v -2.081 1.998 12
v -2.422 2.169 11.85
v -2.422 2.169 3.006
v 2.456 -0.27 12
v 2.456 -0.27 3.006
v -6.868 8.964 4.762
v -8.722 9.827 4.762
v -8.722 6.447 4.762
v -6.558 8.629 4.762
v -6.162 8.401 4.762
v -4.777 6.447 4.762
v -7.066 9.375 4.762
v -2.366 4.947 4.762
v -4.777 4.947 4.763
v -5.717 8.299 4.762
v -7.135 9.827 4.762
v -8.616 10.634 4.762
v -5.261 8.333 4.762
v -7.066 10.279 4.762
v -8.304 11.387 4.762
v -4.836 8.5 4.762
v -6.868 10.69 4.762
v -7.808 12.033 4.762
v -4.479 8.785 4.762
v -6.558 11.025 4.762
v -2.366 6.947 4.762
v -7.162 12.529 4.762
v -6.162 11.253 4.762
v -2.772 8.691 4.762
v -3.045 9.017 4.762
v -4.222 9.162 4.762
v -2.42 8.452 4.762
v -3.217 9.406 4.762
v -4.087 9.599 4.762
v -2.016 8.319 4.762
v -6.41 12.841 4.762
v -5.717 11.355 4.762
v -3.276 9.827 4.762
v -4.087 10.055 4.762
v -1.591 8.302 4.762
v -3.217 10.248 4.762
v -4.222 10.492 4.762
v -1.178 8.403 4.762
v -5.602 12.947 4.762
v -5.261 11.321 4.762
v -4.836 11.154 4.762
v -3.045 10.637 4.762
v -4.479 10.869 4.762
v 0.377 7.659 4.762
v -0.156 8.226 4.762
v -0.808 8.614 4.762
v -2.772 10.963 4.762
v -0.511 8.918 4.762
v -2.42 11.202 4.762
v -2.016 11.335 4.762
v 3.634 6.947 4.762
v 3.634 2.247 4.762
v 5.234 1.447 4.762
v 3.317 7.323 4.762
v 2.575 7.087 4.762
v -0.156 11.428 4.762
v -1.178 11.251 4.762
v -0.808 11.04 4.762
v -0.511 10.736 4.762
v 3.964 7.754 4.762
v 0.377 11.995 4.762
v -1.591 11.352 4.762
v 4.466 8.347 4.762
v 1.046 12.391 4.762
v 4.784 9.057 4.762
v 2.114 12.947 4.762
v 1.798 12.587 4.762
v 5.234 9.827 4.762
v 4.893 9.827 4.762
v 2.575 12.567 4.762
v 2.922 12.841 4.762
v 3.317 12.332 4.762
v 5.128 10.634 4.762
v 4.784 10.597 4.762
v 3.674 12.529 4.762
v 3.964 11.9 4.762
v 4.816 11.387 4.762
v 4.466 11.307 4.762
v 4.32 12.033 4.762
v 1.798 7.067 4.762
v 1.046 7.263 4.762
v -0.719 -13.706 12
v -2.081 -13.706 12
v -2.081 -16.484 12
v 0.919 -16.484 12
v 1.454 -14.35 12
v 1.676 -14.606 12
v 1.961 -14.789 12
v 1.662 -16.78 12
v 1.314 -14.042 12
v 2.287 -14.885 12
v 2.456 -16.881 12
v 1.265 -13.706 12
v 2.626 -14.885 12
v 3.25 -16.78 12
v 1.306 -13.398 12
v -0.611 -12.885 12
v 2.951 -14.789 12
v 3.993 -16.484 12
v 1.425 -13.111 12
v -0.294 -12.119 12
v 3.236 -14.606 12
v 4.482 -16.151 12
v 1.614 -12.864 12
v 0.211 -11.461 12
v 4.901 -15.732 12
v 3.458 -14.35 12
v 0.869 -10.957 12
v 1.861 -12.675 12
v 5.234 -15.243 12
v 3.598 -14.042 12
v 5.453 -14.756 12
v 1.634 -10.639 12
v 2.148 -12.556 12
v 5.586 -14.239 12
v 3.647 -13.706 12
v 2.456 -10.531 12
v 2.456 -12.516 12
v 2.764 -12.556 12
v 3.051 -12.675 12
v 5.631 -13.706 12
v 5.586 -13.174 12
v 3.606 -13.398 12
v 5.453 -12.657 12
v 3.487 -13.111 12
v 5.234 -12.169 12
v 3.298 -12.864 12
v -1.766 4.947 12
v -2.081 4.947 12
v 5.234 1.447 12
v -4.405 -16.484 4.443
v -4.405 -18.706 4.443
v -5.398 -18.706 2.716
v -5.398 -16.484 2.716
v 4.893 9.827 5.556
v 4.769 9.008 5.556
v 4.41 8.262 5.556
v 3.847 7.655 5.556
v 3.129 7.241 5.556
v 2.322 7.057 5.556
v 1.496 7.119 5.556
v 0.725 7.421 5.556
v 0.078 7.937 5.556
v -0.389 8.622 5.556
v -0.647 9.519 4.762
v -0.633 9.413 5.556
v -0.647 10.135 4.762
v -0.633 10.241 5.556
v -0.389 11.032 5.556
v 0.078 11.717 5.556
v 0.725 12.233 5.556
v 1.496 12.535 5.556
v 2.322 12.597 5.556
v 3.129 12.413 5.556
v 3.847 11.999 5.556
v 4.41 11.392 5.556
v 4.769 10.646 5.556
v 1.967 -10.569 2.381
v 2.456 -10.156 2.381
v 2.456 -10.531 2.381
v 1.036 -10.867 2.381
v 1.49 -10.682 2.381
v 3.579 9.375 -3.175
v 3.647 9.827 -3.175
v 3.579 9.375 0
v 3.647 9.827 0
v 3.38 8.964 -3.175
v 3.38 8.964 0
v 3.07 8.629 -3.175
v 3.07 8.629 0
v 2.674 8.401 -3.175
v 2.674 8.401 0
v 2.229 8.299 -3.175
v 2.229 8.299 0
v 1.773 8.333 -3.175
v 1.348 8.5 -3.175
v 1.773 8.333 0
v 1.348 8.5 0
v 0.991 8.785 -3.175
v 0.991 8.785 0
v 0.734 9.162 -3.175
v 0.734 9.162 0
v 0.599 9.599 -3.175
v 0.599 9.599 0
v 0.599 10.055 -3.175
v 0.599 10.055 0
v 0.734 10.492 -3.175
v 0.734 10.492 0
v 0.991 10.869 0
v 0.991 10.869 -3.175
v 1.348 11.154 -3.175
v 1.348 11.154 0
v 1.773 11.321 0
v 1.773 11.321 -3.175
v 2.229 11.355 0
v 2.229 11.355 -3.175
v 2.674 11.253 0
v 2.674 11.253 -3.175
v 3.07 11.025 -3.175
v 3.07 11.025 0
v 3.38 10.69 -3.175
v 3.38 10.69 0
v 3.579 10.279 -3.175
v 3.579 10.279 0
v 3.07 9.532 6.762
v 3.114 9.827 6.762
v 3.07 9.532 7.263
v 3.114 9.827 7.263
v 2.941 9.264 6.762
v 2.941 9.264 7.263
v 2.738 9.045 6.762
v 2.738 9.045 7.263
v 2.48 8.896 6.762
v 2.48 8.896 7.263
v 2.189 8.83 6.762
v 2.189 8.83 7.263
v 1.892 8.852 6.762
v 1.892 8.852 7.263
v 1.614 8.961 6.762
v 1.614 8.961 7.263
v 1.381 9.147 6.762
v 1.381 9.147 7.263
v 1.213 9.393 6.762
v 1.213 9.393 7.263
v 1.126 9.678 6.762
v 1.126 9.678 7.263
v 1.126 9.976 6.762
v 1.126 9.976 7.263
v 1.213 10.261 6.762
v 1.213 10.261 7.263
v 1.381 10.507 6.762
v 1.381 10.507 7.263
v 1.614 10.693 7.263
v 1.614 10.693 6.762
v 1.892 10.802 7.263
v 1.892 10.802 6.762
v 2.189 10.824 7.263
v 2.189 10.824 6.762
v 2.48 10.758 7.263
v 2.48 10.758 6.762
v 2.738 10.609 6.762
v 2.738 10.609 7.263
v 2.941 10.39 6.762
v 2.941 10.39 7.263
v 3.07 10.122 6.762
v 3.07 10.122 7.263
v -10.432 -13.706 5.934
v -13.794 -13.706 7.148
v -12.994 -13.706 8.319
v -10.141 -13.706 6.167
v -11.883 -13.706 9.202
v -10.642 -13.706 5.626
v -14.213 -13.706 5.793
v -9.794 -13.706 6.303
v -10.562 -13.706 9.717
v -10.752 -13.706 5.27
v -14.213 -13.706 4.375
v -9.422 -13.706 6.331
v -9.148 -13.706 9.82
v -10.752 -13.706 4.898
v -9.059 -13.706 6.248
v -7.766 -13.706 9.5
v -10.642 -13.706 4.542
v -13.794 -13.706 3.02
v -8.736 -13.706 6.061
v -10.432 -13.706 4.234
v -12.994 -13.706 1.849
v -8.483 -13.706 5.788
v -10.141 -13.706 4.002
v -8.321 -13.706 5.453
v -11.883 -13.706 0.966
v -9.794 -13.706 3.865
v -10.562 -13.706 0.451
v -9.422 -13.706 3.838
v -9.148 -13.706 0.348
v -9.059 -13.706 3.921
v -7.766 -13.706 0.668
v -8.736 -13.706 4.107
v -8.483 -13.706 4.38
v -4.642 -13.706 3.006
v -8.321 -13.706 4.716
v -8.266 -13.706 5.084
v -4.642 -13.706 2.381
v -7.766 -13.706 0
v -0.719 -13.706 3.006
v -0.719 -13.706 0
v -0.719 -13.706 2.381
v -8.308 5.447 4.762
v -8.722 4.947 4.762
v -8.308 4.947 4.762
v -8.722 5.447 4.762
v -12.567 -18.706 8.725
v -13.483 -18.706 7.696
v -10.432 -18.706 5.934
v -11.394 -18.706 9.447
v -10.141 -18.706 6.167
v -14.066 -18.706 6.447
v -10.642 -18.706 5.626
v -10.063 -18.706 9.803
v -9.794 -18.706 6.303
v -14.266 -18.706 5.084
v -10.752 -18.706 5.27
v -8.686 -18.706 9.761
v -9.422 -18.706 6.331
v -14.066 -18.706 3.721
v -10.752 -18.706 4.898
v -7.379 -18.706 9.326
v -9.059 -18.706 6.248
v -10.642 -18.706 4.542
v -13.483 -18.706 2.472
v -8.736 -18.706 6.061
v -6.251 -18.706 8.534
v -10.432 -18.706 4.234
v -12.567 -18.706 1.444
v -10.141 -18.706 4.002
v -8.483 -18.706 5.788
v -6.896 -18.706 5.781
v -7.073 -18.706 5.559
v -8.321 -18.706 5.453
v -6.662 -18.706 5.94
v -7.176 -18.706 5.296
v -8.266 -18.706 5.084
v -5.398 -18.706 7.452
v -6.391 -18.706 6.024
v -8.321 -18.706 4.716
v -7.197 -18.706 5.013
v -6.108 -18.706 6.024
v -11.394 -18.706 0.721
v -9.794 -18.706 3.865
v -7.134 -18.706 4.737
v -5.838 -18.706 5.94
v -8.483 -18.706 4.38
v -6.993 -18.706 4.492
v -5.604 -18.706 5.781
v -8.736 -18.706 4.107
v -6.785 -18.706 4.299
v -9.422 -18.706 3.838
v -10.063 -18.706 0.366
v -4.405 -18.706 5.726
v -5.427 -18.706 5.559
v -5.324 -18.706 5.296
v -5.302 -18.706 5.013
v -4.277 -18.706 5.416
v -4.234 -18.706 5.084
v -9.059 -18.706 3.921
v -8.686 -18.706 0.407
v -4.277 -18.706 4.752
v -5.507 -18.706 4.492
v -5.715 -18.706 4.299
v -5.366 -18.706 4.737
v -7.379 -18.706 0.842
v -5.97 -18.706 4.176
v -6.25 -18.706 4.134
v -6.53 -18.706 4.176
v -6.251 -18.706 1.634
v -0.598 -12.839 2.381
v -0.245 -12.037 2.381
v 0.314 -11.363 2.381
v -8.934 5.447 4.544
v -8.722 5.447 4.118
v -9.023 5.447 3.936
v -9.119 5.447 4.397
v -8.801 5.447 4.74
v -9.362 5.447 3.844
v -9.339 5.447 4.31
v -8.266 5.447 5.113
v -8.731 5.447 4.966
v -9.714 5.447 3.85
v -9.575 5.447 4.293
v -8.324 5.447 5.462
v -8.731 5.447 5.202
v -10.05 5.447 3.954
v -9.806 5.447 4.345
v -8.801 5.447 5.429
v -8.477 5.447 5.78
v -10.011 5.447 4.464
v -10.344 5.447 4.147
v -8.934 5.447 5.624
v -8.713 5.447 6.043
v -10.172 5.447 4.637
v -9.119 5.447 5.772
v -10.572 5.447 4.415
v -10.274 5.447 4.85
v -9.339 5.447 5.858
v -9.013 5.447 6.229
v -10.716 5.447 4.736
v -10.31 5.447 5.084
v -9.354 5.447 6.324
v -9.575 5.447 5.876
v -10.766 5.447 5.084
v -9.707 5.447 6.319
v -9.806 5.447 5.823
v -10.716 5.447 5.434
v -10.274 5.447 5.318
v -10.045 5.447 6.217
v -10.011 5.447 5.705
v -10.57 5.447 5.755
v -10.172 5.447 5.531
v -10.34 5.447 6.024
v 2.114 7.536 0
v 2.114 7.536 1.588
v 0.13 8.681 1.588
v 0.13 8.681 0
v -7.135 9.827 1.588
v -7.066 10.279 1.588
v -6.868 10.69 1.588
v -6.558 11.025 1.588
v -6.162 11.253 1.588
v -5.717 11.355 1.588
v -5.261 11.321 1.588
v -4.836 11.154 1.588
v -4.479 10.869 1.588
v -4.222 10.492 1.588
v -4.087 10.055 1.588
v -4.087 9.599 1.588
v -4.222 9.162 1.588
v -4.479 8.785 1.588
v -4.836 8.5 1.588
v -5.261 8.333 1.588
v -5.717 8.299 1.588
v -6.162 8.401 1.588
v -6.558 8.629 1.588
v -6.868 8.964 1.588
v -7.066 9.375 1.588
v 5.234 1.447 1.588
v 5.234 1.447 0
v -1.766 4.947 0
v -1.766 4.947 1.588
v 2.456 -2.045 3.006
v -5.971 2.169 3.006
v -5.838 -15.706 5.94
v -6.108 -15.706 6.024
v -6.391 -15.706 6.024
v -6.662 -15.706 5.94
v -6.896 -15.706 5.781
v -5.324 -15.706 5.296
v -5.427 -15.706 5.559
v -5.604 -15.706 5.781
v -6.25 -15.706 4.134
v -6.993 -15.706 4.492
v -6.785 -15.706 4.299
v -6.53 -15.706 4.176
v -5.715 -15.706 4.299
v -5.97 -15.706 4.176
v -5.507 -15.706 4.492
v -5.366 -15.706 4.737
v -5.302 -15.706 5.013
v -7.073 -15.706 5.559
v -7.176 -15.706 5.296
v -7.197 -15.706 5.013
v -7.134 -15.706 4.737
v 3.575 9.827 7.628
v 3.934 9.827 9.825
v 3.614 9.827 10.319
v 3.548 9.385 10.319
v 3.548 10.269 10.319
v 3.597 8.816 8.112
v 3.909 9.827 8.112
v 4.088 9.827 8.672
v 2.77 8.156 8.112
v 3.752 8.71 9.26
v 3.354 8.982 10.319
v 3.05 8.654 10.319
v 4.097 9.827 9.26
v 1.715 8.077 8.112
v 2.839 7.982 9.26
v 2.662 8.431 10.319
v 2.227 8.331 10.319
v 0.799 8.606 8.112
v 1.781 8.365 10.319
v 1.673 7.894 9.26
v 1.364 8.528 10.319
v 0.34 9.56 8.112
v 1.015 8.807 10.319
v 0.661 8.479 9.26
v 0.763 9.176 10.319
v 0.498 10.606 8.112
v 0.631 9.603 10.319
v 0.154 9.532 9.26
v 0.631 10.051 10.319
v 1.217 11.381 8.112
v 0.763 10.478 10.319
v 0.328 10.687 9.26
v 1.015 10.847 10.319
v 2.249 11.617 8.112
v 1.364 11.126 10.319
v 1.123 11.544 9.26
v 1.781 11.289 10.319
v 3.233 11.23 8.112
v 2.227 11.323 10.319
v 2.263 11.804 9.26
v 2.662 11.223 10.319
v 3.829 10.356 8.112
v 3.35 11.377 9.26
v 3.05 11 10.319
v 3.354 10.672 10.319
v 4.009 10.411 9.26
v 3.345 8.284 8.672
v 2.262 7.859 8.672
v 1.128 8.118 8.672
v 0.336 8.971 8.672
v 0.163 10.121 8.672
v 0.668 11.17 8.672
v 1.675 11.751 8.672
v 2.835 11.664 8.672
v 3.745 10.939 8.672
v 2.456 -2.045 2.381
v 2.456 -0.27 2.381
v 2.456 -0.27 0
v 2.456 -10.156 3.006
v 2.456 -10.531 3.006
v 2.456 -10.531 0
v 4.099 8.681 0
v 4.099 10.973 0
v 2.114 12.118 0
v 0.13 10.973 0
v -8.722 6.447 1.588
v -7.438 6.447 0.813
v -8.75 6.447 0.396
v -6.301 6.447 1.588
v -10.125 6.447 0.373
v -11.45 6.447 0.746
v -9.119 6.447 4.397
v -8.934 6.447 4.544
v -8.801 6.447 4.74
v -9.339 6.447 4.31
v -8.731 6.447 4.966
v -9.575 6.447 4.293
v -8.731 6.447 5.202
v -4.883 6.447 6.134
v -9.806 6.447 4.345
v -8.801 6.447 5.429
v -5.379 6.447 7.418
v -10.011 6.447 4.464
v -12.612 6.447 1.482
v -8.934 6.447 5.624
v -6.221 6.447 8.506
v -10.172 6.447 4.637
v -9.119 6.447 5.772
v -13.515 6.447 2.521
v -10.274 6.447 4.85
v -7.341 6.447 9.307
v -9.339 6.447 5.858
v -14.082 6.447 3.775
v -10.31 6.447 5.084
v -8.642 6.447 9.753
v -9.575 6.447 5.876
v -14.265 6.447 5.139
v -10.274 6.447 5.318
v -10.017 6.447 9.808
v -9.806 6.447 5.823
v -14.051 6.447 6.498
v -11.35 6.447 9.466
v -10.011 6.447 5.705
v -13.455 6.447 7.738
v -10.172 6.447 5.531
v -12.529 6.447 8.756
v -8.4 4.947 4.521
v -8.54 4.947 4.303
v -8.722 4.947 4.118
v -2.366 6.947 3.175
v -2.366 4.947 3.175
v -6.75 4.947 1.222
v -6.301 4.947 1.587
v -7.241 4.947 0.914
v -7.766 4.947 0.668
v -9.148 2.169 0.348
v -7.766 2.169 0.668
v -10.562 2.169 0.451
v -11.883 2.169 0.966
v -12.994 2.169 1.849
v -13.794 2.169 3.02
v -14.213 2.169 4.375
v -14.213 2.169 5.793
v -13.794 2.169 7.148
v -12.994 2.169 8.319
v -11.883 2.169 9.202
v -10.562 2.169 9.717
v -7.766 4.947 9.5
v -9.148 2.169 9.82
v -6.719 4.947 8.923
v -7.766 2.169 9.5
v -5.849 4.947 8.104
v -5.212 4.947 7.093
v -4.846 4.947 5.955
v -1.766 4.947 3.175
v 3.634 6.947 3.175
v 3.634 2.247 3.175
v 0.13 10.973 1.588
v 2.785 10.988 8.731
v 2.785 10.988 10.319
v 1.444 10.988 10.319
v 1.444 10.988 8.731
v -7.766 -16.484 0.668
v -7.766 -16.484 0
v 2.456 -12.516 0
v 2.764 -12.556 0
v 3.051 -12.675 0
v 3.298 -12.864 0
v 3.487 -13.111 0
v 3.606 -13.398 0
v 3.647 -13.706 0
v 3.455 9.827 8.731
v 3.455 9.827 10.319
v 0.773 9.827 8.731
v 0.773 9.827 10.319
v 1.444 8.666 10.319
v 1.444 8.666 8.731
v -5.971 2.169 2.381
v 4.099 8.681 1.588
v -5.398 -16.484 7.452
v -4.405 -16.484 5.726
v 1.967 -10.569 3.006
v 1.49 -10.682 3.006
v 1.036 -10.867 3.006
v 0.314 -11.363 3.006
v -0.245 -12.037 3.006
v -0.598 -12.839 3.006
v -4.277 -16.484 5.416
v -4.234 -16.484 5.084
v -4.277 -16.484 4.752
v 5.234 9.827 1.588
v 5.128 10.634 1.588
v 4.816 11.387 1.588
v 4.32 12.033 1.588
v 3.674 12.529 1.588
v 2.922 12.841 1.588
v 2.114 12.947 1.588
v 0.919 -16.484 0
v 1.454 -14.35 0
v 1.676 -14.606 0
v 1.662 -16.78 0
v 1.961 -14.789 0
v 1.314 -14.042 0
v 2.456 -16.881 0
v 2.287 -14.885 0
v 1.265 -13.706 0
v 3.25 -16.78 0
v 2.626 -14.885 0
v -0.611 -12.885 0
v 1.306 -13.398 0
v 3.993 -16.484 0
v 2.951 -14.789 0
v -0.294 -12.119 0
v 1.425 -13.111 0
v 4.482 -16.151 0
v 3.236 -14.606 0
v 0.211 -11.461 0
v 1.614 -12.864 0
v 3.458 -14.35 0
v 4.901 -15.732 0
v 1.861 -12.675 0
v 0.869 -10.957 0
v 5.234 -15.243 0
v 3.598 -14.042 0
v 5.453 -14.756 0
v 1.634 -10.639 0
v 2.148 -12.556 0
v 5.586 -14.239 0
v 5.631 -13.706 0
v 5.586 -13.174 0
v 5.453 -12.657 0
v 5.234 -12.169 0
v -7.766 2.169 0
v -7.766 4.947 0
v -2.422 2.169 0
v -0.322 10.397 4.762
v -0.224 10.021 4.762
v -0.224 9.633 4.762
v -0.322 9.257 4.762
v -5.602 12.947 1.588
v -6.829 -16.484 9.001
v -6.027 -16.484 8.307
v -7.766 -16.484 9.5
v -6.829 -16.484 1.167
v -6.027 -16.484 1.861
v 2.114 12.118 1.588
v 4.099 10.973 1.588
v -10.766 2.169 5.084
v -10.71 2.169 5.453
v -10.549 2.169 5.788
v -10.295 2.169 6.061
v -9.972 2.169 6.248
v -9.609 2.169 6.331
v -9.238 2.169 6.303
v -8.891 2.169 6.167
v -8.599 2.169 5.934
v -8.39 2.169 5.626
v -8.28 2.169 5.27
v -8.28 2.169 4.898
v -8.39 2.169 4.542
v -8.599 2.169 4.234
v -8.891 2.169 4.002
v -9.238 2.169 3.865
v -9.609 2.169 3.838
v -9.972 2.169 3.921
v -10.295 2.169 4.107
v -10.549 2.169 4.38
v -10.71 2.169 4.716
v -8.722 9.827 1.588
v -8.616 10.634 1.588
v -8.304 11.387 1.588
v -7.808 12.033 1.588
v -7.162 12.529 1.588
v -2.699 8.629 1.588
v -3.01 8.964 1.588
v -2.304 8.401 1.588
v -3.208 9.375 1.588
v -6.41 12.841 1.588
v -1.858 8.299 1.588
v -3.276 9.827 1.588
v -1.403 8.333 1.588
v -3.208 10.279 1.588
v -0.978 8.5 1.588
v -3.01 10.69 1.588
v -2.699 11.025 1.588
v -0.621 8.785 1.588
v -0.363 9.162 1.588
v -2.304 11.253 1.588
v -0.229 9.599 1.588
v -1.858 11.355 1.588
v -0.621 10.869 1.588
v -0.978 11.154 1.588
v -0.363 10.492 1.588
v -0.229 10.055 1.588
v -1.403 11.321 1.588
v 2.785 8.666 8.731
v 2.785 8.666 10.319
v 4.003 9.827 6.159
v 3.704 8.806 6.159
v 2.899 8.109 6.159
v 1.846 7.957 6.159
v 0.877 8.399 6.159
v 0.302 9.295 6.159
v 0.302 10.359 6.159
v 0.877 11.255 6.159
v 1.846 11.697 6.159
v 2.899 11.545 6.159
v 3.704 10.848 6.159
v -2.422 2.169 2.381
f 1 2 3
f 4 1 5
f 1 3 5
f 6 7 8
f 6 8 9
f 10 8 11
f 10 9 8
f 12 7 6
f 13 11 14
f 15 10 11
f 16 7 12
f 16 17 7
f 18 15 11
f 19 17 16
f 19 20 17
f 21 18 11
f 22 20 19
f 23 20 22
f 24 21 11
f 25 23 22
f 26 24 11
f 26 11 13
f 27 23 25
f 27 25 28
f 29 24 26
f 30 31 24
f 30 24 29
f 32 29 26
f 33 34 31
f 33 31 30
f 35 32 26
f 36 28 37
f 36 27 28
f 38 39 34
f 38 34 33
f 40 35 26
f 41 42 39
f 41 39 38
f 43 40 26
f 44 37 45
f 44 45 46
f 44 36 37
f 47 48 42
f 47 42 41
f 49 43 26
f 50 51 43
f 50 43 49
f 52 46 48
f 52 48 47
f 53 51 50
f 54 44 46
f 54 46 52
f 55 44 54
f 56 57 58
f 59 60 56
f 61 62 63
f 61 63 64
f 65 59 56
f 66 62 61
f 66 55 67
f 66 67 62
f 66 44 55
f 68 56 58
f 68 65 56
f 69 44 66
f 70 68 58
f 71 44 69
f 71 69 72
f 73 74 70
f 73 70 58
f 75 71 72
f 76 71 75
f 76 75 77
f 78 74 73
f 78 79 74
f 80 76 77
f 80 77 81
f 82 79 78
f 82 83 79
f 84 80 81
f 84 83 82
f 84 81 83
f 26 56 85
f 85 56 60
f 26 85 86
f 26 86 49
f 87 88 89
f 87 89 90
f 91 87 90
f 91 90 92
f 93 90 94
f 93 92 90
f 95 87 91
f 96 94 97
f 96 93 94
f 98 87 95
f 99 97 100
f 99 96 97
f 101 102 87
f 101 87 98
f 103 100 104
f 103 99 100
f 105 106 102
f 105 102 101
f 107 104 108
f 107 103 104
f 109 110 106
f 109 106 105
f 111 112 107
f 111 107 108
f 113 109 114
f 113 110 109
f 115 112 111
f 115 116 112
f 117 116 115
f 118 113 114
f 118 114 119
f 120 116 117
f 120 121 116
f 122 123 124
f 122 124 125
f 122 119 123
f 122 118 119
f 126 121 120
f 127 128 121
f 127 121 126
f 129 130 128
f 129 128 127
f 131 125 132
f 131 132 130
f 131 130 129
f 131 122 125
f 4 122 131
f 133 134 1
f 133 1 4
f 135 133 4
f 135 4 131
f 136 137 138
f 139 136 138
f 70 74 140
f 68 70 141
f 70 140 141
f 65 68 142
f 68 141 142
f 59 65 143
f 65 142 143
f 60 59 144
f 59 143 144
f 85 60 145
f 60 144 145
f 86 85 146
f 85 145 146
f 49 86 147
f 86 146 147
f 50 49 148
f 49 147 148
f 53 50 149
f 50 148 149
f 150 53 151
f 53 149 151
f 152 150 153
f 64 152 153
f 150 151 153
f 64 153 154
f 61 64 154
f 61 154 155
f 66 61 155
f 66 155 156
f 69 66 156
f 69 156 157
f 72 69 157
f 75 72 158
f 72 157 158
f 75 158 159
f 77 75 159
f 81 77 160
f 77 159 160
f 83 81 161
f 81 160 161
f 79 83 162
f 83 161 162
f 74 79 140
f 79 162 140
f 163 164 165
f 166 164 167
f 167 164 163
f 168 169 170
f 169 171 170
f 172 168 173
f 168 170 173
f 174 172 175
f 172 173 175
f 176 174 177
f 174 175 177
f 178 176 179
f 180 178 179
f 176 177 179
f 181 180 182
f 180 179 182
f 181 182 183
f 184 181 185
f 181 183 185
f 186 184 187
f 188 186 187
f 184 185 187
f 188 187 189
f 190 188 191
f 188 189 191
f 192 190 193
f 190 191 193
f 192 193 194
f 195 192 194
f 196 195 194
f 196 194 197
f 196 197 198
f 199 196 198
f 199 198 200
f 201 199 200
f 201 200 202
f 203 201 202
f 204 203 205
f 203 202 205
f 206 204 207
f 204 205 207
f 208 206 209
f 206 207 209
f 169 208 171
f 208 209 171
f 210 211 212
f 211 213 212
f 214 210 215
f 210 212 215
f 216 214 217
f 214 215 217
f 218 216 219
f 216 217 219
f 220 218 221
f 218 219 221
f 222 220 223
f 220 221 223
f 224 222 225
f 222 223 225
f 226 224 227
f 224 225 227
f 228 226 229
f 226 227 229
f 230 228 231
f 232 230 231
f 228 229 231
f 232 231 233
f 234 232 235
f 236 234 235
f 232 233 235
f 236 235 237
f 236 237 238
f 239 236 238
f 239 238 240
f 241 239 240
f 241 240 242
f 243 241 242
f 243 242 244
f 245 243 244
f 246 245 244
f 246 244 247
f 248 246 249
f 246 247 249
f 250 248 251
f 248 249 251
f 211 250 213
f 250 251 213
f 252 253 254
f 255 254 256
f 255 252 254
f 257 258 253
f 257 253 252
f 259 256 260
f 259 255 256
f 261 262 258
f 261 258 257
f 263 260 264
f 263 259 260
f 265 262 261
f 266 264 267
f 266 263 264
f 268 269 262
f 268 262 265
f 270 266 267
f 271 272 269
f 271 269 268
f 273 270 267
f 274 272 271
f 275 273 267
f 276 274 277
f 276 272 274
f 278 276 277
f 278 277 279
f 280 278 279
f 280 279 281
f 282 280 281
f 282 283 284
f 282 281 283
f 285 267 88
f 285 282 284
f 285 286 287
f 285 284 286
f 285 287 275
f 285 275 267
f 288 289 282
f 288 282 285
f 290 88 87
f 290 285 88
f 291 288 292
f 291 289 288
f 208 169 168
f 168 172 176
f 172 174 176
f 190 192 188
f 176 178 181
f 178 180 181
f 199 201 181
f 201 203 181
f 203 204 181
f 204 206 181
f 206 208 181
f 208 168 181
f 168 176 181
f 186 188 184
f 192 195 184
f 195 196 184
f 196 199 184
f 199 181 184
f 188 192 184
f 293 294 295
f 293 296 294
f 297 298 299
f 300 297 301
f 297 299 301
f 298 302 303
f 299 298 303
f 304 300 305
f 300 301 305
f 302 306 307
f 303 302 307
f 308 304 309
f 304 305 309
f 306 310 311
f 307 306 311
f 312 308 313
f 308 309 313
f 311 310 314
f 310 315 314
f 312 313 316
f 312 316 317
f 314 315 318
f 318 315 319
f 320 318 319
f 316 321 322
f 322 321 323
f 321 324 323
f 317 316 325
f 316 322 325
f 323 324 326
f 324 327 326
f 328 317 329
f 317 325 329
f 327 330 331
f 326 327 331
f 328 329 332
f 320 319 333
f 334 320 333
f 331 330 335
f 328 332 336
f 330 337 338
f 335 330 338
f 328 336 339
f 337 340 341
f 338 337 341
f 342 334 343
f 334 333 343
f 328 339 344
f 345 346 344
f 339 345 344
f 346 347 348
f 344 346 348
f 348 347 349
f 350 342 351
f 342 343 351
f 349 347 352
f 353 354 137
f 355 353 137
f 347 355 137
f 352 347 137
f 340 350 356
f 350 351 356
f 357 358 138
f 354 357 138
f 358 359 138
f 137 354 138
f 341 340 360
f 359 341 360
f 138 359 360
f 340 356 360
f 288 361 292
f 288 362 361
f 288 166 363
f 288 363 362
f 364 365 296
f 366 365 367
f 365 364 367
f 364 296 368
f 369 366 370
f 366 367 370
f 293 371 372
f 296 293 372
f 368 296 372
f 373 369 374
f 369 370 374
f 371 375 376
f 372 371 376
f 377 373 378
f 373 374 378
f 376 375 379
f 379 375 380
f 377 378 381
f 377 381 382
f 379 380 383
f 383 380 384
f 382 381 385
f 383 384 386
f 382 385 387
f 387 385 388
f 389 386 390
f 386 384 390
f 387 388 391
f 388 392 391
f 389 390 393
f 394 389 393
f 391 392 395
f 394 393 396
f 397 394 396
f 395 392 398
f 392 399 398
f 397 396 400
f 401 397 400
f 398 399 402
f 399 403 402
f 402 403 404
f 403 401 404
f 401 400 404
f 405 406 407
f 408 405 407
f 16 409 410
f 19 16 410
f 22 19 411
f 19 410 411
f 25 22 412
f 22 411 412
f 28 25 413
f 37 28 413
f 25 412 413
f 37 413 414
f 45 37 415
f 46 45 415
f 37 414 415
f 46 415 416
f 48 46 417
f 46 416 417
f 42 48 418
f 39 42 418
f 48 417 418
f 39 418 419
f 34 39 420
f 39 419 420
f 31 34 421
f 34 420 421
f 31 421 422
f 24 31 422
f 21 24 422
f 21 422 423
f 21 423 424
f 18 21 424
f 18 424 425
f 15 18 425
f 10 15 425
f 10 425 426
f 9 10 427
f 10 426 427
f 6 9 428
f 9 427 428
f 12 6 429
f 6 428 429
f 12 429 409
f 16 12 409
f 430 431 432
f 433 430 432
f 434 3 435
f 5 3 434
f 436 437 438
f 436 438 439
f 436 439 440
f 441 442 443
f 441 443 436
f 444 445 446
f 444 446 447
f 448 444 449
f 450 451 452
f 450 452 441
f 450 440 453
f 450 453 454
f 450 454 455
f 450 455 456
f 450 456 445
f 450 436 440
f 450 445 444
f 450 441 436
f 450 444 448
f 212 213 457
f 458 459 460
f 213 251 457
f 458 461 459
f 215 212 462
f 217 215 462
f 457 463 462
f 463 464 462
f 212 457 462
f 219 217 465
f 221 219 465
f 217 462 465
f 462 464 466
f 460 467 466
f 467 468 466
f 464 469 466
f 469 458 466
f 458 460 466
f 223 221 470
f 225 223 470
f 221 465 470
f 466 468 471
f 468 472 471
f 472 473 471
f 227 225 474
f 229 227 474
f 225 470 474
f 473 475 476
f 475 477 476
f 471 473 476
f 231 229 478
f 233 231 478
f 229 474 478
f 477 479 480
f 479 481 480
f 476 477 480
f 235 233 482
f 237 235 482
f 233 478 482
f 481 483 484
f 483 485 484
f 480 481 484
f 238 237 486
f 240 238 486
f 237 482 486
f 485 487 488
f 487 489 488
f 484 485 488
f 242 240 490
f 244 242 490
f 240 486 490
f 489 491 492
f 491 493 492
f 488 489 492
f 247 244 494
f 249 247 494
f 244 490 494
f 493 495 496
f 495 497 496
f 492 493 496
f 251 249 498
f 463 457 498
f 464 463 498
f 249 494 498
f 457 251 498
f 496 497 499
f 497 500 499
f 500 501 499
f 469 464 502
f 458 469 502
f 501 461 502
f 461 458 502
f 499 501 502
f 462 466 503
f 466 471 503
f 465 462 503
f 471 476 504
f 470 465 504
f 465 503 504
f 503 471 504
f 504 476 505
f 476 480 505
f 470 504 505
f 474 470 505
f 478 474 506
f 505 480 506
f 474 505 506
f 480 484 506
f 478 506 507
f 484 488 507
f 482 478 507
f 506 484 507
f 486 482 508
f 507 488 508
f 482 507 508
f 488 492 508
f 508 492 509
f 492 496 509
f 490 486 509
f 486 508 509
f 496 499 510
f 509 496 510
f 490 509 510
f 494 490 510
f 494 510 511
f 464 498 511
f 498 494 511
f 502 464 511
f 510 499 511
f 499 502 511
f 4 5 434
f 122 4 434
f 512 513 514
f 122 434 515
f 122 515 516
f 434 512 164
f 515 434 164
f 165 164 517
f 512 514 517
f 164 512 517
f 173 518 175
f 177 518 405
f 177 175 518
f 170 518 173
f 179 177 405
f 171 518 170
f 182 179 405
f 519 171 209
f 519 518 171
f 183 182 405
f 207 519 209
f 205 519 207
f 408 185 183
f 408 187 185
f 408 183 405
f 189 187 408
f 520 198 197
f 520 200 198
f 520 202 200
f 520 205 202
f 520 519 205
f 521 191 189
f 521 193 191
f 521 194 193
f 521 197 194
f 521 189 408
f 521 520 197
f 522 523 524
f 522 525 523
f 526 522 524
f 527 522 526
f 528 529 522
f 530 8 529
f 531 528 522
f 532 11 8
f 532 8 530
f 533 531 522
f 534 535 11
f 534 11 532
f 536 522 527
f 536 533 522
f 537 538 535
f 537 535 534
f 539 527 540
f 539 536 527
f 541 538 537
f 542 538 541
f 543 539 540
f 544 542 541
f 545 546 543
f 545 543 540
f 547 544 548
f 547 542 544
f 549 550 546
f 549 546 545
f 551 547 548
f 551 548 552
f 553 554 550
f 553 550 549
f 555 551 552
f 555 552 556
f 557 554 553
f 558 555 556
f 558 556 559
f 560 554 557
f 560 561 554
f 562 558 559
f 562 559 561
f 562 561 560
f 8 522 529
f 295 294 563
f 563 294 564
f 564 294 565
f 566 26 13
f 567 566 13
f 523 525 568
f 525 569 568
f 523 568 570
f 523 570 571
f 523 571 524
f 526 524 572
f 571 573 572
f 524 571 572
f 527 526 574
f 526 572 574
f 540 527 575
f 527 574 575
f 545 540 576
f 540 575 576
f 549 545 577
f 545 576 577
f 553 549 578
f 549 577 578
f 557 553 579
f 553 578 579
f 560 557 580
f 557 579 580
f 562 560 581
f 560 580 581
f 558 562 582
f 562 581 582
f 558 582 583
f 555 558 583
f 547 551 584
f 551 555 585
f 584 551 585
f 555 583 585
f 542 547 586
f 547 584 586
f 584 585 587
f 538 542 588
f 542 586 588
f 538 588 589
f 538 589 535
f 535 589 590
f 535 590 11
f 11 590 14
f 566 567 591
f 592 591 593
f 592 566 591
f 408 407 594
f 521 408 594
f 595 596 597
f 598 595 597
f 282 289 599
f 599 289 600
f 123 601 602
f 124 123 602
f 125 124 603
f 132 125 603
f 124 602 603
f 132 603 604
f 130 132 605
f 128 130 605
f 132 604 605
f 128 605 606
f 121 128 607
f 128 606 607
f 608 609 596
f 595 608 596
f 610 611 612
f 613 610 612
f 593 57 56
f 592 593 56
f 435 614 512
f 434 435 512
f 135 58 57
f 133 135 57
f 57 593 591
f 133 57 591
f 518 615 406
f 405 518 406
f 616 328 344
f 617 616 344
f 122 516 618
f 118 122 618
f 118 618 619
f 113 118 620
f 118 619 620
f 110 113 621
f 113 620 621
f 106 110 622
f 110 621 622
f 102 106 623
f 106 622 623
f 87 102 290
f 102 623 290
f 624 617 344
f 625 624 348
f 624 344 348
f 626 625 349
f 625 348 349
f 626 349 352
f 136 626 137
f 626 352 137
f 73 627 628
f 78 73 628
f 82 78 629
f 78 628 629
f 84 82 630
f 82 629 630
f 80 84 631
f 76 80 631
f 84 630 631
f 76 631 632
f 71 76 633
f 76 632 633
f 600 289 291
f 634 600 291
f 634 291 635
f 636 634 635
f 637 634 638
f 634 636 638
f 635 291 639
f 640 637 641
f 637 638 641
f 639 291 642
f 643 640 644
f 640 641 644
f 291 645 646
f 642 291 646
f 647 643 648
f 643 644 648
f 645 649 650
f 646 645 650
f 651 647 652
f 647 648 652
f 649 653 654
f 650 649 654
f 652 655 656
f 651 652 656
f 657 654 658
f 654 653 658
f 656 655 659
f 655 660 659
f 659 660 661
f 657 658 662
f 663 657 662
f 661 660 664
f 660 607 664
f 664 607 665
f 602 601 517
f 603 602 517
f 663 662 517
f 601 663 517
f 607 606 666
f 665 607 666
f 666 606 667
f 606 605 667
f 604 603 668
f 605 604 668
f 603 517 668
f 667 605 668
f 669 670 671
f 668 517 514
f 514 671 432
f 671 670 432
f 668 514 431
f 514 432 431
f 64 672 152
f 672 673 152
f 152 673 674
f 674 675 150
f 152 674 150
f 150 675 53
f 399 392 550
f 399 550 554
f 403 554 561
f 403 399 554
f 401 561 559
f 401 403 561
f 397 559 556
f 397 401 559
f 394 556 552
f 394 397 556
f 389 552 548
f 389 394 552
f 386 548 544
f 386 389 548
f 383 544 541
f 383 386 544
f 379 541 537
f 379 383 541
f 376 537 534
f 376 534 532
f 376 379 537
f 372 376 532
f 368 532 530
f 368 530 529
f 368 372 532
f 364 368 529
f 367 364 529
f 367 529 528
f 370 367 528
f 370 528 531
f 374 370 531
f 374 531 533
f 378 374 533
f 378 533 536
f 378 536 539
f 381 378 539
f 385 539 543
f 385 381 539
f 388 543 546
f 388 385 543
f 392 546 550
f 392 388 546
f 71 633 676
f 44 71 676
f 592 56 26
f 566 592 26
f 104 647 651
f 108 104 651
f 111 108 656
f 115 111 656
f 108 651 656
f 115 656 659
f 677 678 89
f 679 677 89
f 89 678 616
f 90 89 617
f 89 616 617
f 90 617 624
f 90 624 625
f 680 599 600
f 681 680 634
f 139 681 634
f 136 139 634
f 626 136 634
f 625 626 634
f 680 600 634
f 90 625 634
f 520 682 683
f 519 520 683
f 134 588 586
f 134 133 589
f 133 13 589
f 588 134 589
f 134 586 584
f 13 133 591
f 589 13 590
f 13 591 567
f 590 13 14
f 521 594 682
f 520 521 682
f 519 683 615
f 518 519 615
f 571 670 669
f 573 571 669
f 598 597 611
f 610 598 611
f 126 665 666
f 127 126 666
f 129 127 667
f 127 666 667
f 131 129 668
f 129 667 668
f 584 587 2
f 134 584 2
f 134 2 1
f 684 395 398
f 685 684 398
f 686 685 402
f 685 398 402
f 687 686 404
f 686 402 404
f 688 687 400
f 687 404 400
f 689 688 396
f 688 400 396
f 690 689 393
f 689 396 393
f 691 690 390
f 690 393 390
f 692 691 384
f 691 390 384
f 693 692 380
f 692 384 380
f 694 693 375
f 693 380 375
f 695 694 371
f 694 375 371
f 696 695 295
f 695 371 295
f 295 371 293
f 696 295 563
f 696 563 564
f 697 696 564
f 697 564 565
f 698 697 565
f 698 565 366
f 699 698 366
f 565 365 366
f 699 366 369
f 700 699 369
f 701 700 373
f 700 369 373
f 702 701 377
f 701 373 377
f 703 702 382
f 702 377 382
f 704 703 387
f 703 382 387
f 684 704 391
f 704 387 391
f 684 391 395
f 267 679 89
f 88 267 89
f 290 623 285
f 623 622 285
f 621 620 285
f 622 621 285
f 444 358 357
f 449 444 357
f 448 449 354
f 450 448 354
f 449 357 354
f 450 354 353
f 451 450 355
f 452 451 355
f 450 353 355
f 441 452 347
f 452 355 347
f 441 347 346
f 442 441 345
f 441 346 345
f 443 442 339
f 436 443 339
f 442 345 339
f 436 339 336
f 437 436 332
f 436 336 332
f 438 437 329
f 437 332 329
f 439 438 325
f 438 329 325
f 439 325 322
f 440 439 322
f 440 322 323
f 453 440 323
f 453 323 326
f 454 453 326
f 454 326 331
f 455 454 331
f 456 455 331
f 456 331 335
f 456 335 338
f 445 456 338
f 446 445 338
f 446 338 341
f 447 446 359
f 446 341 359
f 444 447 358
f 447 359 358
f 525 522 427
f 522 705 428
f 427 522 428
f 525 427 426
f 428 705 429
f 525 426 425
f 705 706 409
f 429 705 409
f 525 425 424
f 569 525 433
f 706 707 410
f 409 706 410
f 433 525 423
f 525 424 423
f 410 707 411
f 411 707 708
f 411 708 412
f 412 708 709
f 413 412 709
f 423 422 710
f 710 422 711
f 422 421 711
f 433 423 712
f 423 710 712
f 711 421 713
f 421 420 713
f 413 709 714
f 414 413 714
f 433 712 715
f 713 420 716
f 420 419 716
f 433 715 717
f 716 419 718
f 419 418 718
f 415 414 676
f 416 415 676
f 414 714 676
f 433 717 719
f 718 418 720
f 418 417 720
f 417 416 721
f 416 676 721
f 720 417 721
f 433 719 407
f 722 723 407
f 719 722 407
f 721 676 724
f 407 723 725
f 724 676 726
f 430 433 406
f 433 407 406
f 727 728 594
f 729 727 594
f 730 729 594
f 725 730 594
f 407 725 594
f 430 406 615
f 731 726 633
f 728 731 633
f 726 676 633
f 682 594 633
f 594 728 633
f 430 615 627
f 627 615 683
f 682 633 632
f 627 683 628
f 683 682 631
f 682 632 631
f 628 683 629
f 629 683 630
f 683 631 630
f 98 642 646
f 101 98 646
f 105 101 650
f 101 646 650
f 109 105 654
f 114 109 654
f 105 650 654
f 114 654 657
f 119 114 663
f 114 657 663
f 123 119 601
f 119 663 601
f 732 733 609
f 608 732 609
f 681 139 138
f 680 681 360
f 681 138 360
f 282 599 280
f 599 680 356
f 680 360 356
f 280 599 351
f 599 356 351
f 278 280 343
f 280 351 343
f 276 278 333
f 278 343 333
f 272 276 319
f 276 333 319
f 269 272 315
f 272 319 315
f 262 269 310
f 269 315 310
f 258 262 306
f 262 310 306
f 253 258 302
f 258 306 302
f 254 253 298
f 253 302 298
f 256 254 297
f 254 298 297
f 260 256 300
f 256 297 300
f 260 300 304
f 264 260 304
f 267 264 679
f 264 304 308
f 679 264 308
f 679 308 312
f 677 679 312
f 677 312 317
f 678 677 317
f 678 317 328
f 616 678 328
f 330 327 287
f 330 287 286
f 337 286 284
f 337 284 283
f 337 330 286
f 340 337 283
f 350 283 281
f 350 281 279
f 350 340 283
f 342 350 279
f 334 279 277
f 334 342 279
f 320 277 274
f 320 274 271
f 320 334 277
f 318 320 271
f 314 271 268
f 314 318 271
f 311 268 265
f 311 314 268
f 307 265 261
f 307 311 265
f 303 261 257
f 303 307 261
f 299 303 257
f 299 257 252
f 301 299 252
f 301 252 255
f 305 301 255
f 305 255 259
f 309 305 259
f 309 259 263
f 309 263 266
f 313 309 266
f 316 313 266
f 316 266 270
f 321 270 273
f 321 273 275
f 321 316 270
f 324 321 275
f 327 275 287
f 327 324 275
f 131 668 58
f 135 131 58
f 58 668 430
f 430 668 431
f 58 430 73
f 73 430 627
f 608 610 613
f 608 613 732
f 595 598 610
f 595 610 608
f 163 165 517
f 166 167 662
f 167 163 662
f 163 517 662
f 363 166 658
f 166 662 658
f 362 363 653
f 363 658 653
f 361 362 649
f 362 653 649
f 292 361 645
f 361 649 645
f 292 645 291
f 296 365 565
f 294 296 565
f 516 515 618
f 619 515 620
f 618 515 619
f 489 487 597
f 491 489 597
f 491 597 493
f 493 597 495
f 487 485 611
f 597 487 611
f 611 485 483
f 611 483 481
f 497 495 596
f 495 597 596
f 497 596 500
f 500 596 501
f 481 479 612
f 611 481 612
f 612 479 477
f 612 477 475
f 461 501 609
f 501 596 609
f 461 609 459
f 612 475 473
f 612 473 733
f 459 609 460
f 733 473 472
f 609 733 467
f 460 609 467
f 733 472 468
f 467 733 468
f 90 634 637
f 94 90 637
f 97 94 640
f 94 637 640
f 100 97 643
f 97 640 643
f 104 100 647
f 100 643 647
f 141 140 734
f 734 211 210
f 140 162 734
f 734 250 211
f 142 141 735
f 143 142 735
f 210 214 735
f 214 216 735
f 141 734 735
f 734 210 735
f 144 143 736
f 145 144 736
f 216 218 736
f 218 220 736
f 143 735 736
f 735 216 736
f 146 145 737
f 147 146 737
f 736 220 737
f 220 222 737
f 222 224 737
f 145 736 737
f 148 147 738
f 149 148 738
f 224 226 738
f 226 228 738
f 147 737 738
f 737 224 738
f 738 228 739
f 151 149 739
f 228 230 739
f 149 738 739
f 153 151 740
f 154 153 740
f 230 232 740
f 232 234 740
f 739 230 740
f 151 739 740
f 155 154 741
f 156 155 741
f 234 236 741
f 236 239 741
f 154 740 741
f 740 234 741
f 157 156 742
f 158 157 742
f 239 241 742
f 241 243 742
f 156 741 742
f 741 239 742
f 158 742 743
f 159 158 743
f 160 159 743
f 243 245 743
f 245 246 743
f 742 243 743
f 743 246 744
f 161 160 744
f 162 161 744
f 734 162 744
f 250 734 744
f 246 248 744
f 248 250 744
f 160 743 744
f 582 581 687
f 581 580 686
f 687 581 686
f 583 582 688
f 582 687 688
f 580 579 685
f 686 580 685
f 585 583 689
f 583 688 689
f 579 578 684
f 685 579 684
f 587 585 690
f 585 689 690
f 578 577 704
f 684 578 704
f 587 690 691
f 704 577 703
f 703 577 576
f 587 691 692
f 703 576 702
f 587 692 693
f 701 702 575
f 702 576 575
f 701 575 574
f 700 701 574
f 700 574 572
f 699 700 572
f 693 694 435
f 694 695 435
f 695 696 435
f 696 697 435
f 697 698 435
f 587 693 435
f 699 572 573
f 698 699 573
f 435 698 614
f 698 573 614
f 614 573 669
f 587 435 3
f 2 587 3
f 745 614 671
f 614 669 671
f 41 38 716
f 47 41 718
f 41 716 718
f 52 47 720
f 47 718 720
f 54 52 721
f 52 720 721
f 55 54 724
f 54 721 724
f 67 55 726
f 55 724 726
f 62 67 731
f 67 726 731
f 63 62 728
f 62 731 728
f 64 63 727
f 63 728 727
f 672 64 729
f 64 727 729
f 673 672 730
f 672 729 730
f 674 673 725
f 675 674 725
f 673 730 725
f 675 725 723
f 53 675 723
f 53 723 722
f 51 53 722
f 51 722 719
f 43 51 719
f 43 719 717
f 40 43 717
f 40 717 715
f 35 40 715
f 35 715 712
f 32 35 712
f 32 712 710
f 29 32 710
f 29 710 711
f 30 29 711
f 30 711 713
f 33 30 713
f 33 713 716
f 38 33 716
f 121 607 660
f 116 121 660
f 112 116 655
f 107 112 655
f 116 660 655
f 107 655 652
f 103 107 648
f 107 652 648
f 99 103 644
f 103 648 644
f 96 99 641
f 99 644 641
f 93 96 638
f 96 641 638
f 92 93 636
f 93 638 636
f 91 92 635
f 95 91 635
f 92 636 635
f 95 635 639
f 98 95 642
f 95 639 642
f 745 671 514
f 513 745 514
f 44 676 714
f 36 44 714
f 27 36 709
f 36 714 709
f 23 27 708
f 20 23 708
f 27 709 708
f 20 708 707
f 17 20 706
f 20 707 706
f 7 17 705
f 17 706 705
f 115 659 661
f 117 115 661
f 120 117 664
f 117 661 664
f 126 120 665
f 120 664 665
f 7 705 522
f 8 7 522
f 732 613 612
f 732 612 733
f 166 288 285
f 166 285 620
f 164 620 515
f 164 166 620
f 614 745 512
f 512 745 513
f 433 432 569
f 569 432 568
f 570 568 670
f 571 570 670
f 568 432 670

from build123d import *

# Parameters (mm, degrees)
BOSS_EXTRUDE1_DEPTH             = 12
CUT_EXTRUDE1_DEPTH              = 26.760554208
SKETCH4_R                       = 4.75
SKETCH4_R_2                     = 1.25
BOSS_EXTRUDE2_DEPTH             = 1.5
BOSS_EXTRUDE2_DIRECTION_2_REACH = 28.092
BOSS_EXTRUDE3_START             = -5
BOSS_EXTRUDE3_OUTLINE_R         = 1.25
BOSS_EXTRUDE3_DEPTH             = 5
SKETCH6_R                       = 0.95
CUT_EXTRUDE2_DEPTH              = 3
BOSS_EXTRUDE4_START             = -1
SKETCH8_R                       = 1.25
SKETCH8_R_2                     = 0.79375
BOSS_EXTRUDE4_DEPTH             = 1
BOSS_EXTRUDE5_DEPTH             = 0.625
SKETCH11_R                      = 1.532291667
BOSS_EXTRUDE6_DEPTH             = 3.175
CUT_EXTRUDE3_DEPTH              = 1.5875
SKETCH13_R                      = 1.532291667
BOSS_EXTRUDE7_DEPTH             = 1.5875
CUT_EXTRUDE4_DEPTH              = 1.5875


# Read off the part's stored shape, not the designer's step: Boss-Extrude3
with BuildPart() as part:
    # Sketch1 → Boss-Extrude1 (new body)
    with BuildSketch(Plane.XY):
        with BuildLine():
            Line((-1.765801731, 4.94680722), (-7.765801731, 4.94680722))
            Line((-7.765801731, 4.94680722), (-7.765801731, 2.16867722))
            Line((-7.765801731, 2.16867722), (-2.421629262, 2.16867722))
            Line((-2.421629262, 2.16867722), (2.456068269, -0.270171545))
            Line((2.456068269, -0.270171545), (2.456068269, -10.53131278))
            ThreePointArc((2.456068269, -10.53131278), (4.06858061, -10.971275495), (5.234198269, -12.169231551))
            Line((5.234198269, -12.169231551), (5.234198269, 1.44680722))
            Line((5.234198269, 1.44680722), (-1.765801731, 4.94680722))
        make_face()
        with BuildLine():
            Line((5.234198269, -15.243394008), (5.234198269, -12.169231551))
            ThreePointArc((5.234198269, -12.169231551), (4.06858061, -10.971275495), (2.456068269, -10.53131278))
            Line((2.456068269, -10.53131278), (2.456068269, -12.51568778))
            ThreePointArc((2.456068269, -12.51568778), (3.29796728, -12.864413768), (3.646693269, -13.70631278))
            ThreePointArc((3.646693269, -13.70631278), (2.456068269, -14.89693778), (1.265443269, -13.70631278))
            Line((1.265443269, -13.70631278), (-0.718931731, -13.70631278))
            ThreePointArc((-0.718931731, -13.70631278), (-0.278969016, -15.318825121), (0.91898704, -16.48444278))
            Line((0.91898704, -16.48444278), (3.993149497, -16.48444278))
            ThreePointArc((3.993149497, -16.48444278), (4.701132299, -15.95137681), (5.234198269, -15.243394008))
        make_face()
        with BuildLine():
            Line((2.456068269, -12.51568778), (2.456068269, -10.53131278))
            ThreePointArc((2.456068269, -10.53131278), (0.211004238, -11.461248749), (-0.718931731, -13.70631278))
            Line((-0.718931731, -13.70631278), (1.265443269, -13.70631278))
            ThreePointArc((1.265443269, -13.70631278), (1.614169257, -12.864413768), (2.456068269, -12.51568778))
        make_face()
        with BuildLine():
            ThreePointArc((5.631068269, -13.70631278), (5.530250091, -12.91256778), (5.234198269, -12.169231551))
            Line((5.234198269, -12.169231551), (5.234198269, -15.243394008))
            ThreePointArc((5.234198269, -15.243394008), (5.530250091, -14.50005778), (5.631068269, -13.70631278))
        make_face()
        with BuildLine():
            ThreePointArc((0.91898704, -16.48444278), (2.456068269, -16.88131278), (3.993149497, -16.48444278))
            Line((3.993149497, -16.48444278), (0.91898704, -16.48444278))
        make_face()
        with BuildLine():
            ThreePointArc((0.91898704, -16.48444278), (-0.278969016, -15.318825121), (-0.718931731, -13.70631278))
            Line((-0.718931731, -13.70631278), (-7.765801731, -13.70631278))
            Line((-7.765801731, -13.70631278), (-7.765801731, -16.48444278))
            Line((-7.765801731, -16.48444278), (0.91898704, -16.48444278))
        make_face()
    extrude(amount=BOSS_EXTRUDE1_DEPTH)

    # Sketch3 → Cut-Extrude1 (cut, through all)
    with BuildSketch(Plane.XZ.offset(16.48444278)):
        Polygon((-7.765801731, 9.5), (-2.08101296, 12), (-7.765801731, 12), align=None)
    extrude(amount=-CUT_EXTRUDE1_DEPTH, mode=Mode.SUBTRACT)

    # Sketch4 → Boss-Extrude2 (add)
    with BuildSketch(Plane(origin=(0, 4.94680722, 0), x_dir=(1, 0, 0), z_dir=(0, 1, 0))):
        with Locations(Location((-9.515801731, -5.084119567, 0), (0, 0, 180))):
            Circle(SKETCH4_R)
        with Locations(Location((-9.515801731, -5.084119567, 0), (0, 0, 180))):
            Circle(SKETCH4_R_2, mode=Mode.SUBTRACT)
    extrude(amount=BOSS_EXTRUDE2_DEPTH)

    # Boss-Extrude2 direction 2: up to this face of the body (flat: up to its plane)
    boss_extrude2_direction_2_end = Plane(part.part.faces().sort_by_distance((-4.995668733, 2.16867722, 5.359110802))[0])
    # Sketch4 → Boss-Extrude2 direction 2 (add, up to the picked face)
    with BuildSketch(Plane(origin=(0, 4.94680722, 0), x_dir=(1, 0, 0), z_dir=(0, 1, 0)), mode=Mode.PRIVATE) as boss_extrude2_direction_2_sk1:
        with Locations(Location((-9.515801731, -5.084119567, 0), (0, 0, 180))):
            Circle(SKETCH4_R)
        with Locations(Location((-9.515801731, -5.084119567, 0), (0, 0, 180))):
            Circle(SKETCH4_R_2, mode=Mode.SUBTRACT)
    boss_extrude2_direction_2_tool1 = split(extrude(boss_extrude2_direction_2_sk1.sketch, amount=-BOSS_EXTRUDE2_DIRECTION_2_REACH, mode=Mode.PRIVATE), bisect_by=boss_extrude2_direction_2_end, keep=Keep.BOTH, mode=Mode.PRIVATE)
    add(boss_extrude2_direction_2_tool1.solids().sort_by(Axis((-4.900152, 4.946807, 5.08412), (0, -1, 0)))[0])

    # Boss-Extrude3 outline → Boss-Extrude3 (add)
    with BuildSketch(Plane(origin=(0, -13.70631278, 0), x_dir=(1, 0, 0), z_dir=(0, 1, 0)).offset(BOSS_EXTRUDE3_START)):
        with BuildLine():
            ThreePointArc((-5.39824459, -2.715950825), (-14.265801731, -5.084119567), (-5.39824459, -7.452288309))
            Line((-5.39824459, -7.452288309), (-4.405194864, -5.725663462))
            ThreePointArc((-4.405194864, -5.725663462), (-4.233864229, -5.084119567), (-4.405194864, -4.442575672))
            Line((-4.405194864, -4.442575672), (-5.39824459, -2.715950825))
        make_face()
        with Locations((-9.515801731, -5.084119567)):
            Circle(BOSS_EXTRUDE3_OUTLINE_R, mode=Mode.SUBTRACT)
    extrude(amount=BOSS_EXTRUDE3_DEPTH)

    # Sketch6 → Cut-Extrude2 (cut)
    with BuildSketch(Plane.XZ.offset(18.70631278)):
        with Locations(Location((-6.24983298, 5.084119567, 0), (0, 0, 270))):
            Circle(SKETCH6_R)
    extrude(amount=-CUT_EXTRUDE2_DEPTH, mode=Mode.SUBTRACT)

    # Sketch8 → Boss-Extrude4 (add)
    with BuildSketch(Plane(origin=(0, 6.44680722, 0), x_dir=(1, 0, 0), z_dir=(0, 1, 0)).offset(BOSS_EXTRUDE4_START)):
        with Locations(Location((-9.515801731, -5.084119567, 0), (0, 0, 180))):
            Circle(SKETCH8_R)
        with Locations(Location((-9.515801731, -5.084119567, 0), (0, 0, 180))):
            Circle(SKETCH8_R_2, mode=Mode.SUBTRACT)
    extrude(amount=BOSS_EXTRUDE4_DEPTH)

    # Sketch9 → Boss-Extrude5 (add)
    with BuildSketch(Plane(origin=(0, 0, 2.38125), x_dir=(-1, 0, 0), z_dir=(0, 0, -1))):
        Polygon((5.971387176, 2.16867722), (-2.456068269, -2.045050502), (-2.456068269, -0.270171545), (2.421629262, 2.16867722), align=None)
        Polygon((4.642221382, -13.70631278), (-2.456068269, -10.156401543), (-2.456068269, -11.535790724), (0, -13.70631278), align=None)
    extrude(amount=-BOSS_EXTRUDE5_DEPTH)

    # Sketch11 → Boss-Extrude6 (add)
    with BuildSketch(Plane(origin=(0, 0, 1.5875), x_dir=(-1, 0, 0), z_dir=(0, 0, -1))):
        with BuildLine():
            Line((-5.234198269, 1.44680722), (-5.234198269, 9.827015554))
            ThreePointArc((-5.234198269, 9.827015554), (-4.320432445, 12.033041397), (-2.114406602, 12.94680722))
            Line((-2.114406602, 12.94680722), (5.602260065, 12.94680722))
            ThreePointArc((5.602260065, 12.94680722), (7.808285908, 12.033041397), (8.722051731, 9.827015554))
            Line((8.722051731, 9.827015554), (8.722051731, 6.44680722))
            Line((8.722051731, 6.44680722), (8.722051731, 4.94680722))
            Line((8.722051731, 4.94680722), (1.765801731, 4.94680722))
            Line((1.765801731, 4.94680722), (-5.234198269, 1.44680722))
        make_face()
        with Locations((5.602260065, 9.827015554)):
            Circle(SKETCH11_R, mode=Mode.SUBTRACT)
        with Locations((1.743926731, 9.827015554)):
            Circle(SKETCH11_R, mode=Mode.SUBTRACT)
        with Locations((-2.114406602, 9.827015554)):
            Circle(SKETCH11_R, mode=Mode.SUBTRACT)
    extrude(amount=-BOSS_EXTRUDE6_DEPTH)

    # Sketch14 → Cut-Extrude3 (cut)
    with BuildSketch(Plane.XY.offset(4.7625)):
        Polygon((3.634198269, 2.24680722), (3.634198269, 6.94680722), (-2.365801731, 6.94680722), (-2.365801731, 4.94680722), (-1.765801731, 4.94680722), align=None)
    extrude(amount=-CUT_EXTRUDE3_DEPTH, mode=Mode.SUBTRACT)

    # Sketch12 → Revolve1 (revolve)
    with BuildSketch(Plane(origin=(2.114406602, 0, 0), x_dir=(0, 0, -1), z_dir=(1, 0, 0)), mode=Mode.PRIVATE) as revolve1_sk:
        with BuildLine():
            Line((-6.7625, 10.827015554), (-7.2625, 10.827015554))
            ThreePointArc((-7.2625, 10.827015554), (-8.67222129, 11.800758233), (-10.31875, 11.327015554))
            Line((-10.31875, 11.327015554), (-10.31875, 9.827015554))
            Line((-10.31875, 9.827015554), (-1.5875, 9.827015554))
            Line((-1.5875, 9.827015554), (3.175, 9.827015554))
            Line((3.175, 9.827015554), (3.175, 11.35930722))
            Line((3.175, 11.35930722), (-1.5875, 11.35930722))
            Line((-1.5875, 11.35930722), (-4.7625, 11.35930722))
            Line((-4.7625, 11.35930722), (-4.7625, 12.605140554))
            Line((-4.7625, 12.605140554), (-5.55625, 12.605140554))
            Line((-5.55625, 12.605140554), (-6.7625, 10.827015554))
        make_face()
    revolve(revolve1_sk.sketch.rotate(Axis((2.114406602, 9.827015554, 4.7625), (0, 0, -1)), 90), axis=Axis((2.114406602, 9.827015554, 4.7625), (0, 0, -1)))

    # Sketch13 → Boss-Extrude7 (add)
    with BuildSketch(Plane(origin=(0, 0, 1.5875), x_dir=(-1, 0, 0), z_dir=(0, 0, -1))):
        Polygon((-0.130031602, 10.972694994), (-2.114406602, 12.118374435), (-4.098781602, 10.972694994), (-4.098781602, 8.681336113), (-2.114406602, 7.535656673), (-0.130031602, 8.681336113), align=None)
        with Locations(Location((-2.114406602, 9.827015554, 0), (0, 0, 180))):
            Circle(SKETCH13_R, mode=Mode.SUBTRACT)
    extrude(amount=BOSS_EXTRUDE7_DEPTH)

    # Sketch15 → Cut-Extrude4 (cut)
    with BuildSketch(Plane.XY.offset(10.31875)):
        Polygon((3.455328551, 9.827015554), (2.784867577, 10.988288026), (1.443945627, 10.988288026), (0.773484653, 9.827015554), (1.443945627, 8.665743081), (2.784867577, 8.665743081), align=None)
    extrude(amount=-CUT_EXTRUDE4_DEPTH, mode=Mode.SUBTRACT)


solid = part.part
